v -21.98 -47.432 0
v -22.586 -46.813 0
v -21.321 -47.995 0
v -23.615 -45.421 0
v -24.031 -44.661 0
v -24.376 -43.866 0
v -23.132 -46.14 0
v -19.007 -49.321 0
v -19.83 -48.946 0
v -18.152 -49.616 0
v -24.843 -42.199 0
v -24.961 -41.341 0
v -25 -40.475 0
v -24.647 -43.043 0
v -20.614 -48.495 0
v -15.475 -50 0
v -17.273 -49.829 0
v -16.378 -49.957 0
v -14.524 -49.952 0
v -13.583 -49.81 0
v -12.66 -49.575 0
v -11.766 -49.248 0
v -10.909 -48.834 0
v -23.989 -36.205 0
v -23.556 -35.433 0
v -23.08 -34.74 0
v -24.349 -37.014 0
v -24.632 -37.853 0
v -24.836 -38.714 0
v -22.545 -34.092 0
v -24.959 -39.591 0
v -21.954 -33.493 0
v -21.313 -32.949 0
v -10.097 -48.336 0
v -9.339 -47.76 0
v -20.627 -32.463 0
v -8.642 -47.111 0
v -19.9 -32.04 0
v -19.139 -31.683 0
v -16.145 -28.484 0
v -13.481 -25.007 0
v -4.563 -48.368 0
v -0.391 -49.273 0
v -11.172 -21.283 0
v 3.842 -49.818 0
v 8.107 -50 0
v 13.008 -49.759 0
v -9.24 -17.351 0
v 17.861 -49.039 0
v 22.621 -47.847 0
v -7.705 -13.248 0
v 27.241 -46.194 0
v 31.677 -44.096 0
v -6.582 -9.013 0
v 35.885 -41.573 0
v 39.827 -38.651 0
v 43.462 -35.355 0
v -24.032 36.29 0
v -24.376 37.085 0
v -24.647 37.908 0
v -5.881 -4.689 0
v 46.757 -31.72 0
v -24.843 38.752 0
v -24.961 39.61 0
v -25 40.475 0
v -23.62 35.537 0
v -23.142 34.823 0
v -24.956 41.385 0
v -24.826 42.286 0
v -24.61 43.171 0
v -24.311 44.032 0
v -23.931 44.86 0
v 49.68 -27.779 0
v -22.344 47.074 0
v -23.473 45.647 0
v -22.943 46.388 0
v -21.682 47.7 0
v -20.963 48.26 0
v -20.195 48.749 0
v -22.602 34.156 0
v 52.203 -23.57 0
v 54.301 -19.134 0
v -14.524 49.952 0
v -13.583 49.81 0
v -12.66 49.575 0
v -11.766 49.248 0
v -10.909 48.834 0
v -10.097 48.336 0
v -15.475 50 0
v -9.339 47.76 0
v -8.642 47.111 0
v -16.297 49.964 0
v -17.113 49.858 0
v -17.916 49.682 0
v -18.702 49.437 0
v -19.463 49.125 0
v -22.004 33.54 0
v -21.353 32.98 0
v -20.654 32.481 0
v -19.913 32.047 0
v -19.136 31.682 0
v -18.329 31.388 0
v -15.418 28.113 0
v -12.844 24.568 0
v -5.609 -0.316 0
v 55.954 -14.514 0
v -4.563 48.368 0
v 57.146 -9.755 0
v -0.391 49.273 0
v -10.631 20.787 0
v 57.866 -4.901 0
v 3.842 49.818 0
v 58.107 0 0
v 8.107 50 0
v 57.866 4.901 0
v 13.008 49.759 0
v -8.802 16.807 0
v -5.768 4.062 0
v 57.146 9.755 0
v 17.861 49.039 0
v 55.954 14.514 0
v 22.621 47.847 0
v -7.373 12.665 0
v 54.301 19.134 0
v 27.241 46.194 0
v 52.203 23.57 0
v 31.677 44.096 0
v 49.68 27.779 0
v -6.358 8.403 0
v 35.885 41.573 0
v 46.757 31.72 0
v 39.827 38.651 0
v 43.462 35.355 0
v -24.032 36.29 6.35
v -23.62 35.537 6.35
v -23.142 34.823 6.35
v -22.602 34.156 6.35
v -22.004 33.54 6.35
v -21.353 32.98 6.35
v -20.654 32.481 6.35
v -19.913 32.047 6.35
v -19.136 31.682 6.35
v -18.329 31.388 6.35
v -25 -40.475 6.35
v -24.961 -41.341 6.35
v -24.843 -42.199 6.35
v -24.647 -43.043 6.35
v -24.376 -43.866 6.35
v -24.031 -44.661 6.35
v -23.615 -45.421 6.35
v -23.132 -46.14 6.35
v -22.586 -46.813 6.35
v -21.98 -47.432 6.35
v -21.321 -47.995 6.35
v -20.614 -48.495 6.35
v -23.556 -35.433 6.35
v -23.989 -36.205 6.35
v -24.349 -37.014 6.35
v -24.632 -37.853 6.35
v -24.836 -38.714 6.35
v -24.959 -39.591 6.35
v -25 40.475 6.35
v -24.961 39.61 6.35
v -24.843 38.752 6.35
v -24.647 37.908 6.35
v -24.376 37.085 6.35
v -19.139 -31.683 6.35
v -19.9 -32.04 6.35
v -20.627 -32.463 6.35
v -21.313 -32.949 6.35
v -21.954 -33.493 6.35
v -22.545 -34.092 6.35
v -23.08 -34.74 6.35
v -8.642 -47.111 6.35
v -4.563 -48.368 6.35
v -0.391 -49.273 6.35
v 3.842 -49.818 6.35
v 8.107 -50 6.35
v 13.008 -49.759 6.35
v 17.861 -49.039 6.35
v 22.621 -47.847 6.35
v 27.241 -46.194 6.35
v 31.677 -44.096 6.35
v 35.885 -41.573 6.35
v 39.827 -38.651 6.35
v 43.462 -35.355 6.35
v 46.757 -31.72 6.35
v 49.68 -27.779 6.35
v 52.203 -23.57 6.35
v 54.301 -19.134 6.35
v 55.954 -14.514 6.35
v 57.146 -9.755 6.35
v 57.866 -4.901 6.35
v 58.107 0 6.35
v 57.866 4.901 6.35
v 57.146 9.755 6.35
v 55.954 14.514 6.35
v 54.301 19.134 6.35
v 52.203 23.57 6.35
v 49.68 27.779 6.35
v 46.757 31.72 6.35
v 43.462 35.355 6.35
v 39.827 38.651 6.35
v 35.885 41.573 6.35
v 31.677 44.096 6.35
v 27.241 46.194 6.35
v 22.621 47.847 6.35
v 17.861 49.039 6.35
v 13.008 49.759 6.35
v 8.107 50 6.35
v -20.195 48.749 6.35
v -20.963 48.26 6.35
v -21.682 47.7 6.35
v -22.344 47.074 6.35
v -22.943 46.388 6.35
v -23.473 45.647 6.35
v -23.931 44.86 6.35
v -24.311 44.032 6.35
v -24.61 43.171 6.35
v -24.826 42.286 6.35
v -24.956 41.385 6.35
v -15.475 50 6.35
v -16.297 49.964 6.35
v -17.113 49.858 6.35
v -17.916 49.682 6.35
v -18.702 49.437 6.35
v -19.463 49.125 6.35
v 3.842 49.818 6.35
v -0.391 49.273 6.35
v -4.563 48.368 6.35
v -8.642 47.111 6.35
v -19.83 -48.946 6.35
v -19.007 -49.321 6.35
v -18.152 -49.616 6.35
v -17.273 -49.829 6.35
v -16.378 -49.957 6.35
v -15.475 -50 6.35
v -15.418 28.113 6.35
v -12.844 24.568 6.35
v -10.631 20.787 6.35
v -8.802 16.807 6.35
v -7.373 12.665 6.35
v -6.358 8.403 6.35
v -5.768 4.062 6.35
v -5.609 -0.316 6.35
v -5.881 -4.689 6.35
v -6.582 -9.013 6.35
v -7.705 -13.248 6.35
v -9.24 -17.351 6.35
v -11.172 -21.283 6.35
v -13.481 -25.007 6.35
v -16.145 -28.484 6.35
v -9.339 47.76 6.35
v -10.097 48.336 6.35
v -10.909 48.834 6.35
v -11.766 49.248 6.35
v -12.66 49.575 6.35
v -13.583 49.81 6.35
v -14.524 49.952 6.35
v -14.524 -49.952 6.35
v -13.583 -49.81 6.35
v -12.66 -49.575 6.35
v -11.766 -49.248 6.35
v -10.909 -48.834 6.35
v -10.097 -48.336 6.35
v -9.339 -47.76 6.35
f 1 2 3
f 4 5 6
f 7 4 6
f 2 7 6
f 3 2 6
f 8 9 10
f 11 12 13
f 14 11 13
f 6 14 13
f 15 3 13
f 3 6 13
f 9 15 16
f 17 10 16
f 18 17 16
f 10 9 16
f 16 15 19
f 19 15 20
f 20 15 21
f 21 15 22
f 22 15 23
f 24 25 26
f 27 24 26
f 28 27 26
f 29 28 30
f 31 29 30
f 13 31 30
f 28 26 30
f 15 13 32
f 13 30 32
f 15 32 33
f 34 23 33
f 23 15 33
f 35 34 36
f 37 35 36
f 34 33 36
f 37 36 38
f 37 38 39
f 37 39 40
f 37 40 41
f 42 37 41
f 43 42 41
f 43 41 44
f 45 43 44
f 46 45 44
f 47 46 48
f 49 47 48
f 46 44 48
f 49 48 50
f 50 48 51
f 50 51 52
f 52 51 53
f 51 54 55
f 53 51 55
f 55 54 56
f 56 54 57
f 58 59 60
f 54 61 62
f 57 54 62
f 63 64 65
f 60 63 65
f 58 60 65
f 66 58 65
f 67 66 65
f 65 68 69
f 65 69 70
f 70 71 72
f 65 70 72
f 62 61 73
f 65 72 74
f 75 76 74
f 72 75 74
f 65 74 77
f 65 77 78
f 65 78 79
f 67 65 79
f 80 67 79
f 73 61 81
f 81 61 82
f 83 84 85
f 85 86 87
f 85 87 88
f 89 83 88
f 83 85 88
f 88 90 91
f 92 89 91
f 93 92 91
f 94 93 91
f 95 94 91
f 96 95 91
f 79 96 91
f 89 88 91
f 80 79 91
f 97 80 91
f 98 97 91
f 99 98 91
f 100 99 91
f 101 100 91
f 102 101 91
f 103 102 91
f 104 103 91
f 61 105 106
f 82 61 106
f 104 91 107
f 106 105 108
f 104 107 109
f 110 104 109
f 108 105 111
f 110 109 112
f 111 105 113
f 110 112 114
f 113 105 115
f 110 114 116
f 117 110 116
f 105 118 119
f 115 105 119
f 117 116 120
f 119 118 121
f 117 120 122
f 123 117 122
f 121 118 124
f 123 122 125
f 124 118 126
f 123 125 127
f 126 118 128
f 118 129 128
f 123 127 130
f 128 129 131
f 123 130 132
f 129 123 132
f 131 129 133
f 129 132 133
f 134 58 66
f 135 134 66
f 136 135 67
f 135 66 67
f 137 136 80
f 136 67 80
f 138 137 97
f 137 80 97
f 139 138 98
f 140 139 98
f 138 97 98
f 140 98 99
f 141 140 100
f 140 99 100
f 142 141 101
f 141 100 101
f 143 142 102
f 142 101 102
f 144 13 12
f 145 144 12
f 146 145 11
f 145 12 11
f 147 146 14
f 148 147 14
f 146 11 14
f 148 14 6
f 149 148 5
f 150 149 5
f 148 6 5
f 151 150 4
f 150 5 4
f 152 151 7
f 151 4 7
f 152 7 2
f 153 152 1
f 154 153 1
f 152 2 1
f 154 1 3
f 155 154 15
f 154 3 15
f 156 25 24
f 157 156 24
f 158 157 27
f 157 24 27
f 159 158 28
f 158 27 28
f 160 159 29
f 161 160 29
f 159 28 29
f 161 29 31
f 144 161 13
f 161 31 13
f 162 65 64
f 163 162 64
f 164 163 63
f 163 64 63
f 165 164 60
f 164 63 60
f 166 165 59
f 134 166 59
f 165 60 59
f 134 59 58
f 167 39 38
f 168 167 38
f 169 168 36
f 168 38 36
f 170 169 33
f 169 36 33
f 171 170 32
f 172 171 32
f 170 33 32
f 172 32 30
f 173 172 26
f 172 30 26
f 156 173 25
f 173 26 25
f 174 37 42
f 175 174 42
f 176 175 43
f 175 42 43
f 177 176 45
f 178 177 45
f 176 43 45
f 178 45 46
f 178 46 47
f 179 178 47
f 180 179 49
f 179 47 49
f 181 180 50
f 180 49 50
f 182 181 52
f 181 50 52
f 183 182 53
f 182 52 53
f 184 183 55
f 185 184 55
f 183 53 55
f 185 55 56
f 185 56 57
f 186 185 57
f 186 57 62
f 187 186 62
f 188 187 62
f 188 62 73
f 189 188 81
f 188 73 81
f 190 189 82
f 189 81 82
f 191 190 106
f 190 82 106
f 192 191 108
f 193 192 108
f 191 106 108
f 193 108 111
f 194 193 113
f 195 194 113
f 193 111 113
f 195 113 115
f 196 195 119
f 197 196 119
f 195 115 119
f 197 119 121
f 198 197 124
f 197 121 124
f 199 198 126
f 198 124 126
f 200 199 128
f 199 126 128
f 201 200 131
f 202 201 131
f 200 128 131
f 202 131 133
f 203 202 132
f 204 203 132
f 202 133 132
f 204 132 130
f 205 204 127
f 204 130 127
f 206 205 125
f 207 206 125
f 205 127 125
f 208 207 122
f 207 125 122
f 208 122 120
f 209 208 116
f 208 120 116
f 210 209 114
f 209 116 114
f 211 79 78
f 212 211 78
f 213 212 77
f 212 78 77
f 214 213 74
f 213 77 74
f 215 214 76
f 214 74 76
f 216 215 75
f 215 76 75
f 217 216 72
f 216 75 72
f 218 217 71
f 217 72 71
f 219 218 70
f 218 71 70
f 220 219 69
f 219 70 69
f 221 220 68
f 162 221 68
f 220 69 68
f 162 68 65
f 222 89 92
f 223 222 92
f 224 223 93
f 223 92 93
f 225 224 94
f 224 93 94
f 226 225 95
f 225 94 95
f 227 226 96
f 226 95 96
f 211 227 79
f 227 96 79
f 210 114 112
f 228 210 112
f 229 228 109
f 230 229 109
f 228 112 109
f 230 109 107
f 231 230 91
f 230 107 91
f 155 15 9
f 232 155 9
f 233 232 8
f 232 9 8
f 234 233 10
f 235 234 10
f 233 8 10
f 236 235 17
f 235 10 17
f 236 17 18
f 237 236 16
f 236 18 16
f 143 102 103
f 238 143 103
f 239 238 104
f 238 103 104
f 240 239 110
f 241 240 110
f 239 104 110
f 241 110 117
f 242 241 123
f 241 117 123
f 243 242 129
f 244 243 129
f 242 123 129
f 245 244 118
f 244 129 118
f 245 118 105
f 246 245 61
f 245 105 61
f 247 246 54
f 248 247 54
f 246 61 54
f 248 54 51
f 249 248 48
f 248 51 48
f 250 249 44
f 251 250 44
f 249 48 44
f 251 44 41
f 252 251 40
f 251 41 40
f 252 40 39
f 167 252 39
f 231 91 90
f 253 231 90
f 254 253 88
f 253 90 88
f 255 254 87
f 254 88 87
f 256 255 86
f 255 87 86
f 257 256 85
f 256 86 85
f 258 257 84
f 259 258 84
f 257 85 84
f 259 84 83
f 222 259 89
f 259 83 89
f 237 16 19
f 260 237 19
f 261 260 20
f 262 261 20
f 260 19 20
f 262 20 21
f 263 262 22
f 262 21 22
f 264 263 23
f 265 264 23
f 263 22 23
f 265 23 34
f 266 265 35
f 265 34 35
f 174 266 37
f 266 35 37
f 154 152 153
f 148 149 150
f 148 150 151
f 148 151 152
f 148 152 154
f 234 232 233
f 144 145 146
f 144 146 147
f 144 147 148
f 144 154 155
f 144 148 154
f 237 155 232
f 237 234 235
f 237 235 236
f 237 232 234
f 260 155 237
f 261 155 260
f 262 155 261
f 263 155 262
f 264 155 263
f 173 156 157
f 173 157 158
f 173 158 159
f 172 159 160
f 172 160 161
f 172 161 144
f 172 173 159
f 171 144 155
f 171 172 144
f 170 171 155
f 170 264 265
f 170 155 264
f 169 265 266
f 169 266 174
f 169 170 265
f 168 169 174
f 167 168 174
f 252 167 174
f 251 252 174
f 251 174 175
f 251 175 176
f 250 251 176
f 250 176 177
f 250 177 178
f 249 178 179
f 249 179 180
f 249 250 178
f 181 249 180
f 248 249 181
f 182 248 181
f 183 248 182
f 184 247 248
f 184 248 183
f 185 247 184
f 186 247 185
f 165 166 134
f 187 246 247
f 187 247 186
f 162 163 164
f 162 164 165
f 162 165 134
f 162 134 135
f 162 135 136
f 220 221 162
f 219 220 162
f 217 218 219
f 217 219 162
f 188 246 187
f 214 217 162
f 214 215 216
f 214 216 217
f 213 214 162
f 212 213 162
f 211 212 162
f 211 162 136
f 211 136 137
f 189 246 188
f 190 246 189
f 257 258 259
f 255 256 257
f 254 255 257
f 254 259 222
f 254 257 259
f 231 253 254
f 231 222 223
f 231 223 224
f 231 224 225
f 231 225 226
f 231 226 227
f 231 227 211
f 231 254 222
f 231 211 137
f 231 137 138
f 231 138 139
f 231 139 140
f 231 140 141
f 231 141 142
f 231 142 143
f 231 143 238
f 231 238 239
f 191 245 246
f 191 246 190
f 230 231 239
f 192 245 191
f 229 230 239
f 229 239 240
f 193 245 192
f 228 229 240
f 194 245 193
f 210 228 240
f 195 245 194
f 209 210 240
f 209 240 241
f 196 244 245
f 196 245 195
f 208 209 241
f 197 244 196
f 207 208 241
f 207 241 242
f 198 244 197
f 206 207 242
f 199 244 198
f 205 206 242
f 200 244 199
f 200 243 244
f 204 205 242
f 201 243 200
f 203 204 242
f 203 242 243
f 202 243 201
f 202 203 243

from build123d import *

# Parameters (mm, degrees)
F1_DEPTH = 6.35


# Not quite as in the source:
# - a feature names something its author has since deleted; it is built from what else it names


with BuildPart() as f1:
    # F0 (on Top) → F1 (new body)
    with BuildSketch(Plane.XY):
        with BuildLine():
            ThreePointArc((-20.6136406437, -48.4949748961), (-18.1522527003, -49.6160033902), (-15.474999986, -50))
            ThreePointArc((-15.474999986, -50), (-11.7658348983, -49.248124828), (-8.64225073, -47.1112009021))
            ThreePointArc((-8.64225073, -47.1112009021), (-0.3913128261, -49.2725077899), (8.1069210399, -50))
            ThreePointArc((8.1069210399, -50), (58.1069208781, 4.4e-08), (8.1069209519, 50))
            ThreePointArc((8.1069209519, 50), (-0.3913128695, 49.2725077824), (-8.64225073, 47.1112009021))
            ThreePointArc((-8.64225073, 47.1112009021), (-11.7658349048, 49.2481248308), (-15.475, 50))
            ThreePointArc((-15.475, 50), (-17.9163659919, 49.6818103648), (-20.1946207283, 48.7485001771))
            ThreePointArc((-20.1946207283, 48.7485001771), (-23.7115044996, 45.2588915778), (-25, 40.4749999628))
            ThreePointArc((-25, 40.4749999628), (-24.7547421233, 38.3274406584), (-24.0315987301, 36.2904757532))
            ThreePointArc((-24.0315987301, 36.2904757532), (-21.6846733781, 33.2524255603), (-18.3290256128, 31.3876371921))
            ThreePointArc((-18.3290256128, 31.3876371921), (-5.6085763504, -0.3160997755), (-19.1387594108, -31.6828164271))
            ThreePointArc((-19.1387594108, -31.6828164271), (-21.6396911965, -33.2139940469), (-23.5563206429, -35.433385014))
            ThreePointArc((-23.5563206429, -35.433385014), (-24.6319701355, -37.8528781611), (-25, -40.475))
            ThreePointArc((-25, -40.475), (-23.8317690267, -45.0455619386), (-20.6136406437, -48.4949748961))
        make_face()
    extrude(amount=F1_DEPTH)


solid = f1.part
